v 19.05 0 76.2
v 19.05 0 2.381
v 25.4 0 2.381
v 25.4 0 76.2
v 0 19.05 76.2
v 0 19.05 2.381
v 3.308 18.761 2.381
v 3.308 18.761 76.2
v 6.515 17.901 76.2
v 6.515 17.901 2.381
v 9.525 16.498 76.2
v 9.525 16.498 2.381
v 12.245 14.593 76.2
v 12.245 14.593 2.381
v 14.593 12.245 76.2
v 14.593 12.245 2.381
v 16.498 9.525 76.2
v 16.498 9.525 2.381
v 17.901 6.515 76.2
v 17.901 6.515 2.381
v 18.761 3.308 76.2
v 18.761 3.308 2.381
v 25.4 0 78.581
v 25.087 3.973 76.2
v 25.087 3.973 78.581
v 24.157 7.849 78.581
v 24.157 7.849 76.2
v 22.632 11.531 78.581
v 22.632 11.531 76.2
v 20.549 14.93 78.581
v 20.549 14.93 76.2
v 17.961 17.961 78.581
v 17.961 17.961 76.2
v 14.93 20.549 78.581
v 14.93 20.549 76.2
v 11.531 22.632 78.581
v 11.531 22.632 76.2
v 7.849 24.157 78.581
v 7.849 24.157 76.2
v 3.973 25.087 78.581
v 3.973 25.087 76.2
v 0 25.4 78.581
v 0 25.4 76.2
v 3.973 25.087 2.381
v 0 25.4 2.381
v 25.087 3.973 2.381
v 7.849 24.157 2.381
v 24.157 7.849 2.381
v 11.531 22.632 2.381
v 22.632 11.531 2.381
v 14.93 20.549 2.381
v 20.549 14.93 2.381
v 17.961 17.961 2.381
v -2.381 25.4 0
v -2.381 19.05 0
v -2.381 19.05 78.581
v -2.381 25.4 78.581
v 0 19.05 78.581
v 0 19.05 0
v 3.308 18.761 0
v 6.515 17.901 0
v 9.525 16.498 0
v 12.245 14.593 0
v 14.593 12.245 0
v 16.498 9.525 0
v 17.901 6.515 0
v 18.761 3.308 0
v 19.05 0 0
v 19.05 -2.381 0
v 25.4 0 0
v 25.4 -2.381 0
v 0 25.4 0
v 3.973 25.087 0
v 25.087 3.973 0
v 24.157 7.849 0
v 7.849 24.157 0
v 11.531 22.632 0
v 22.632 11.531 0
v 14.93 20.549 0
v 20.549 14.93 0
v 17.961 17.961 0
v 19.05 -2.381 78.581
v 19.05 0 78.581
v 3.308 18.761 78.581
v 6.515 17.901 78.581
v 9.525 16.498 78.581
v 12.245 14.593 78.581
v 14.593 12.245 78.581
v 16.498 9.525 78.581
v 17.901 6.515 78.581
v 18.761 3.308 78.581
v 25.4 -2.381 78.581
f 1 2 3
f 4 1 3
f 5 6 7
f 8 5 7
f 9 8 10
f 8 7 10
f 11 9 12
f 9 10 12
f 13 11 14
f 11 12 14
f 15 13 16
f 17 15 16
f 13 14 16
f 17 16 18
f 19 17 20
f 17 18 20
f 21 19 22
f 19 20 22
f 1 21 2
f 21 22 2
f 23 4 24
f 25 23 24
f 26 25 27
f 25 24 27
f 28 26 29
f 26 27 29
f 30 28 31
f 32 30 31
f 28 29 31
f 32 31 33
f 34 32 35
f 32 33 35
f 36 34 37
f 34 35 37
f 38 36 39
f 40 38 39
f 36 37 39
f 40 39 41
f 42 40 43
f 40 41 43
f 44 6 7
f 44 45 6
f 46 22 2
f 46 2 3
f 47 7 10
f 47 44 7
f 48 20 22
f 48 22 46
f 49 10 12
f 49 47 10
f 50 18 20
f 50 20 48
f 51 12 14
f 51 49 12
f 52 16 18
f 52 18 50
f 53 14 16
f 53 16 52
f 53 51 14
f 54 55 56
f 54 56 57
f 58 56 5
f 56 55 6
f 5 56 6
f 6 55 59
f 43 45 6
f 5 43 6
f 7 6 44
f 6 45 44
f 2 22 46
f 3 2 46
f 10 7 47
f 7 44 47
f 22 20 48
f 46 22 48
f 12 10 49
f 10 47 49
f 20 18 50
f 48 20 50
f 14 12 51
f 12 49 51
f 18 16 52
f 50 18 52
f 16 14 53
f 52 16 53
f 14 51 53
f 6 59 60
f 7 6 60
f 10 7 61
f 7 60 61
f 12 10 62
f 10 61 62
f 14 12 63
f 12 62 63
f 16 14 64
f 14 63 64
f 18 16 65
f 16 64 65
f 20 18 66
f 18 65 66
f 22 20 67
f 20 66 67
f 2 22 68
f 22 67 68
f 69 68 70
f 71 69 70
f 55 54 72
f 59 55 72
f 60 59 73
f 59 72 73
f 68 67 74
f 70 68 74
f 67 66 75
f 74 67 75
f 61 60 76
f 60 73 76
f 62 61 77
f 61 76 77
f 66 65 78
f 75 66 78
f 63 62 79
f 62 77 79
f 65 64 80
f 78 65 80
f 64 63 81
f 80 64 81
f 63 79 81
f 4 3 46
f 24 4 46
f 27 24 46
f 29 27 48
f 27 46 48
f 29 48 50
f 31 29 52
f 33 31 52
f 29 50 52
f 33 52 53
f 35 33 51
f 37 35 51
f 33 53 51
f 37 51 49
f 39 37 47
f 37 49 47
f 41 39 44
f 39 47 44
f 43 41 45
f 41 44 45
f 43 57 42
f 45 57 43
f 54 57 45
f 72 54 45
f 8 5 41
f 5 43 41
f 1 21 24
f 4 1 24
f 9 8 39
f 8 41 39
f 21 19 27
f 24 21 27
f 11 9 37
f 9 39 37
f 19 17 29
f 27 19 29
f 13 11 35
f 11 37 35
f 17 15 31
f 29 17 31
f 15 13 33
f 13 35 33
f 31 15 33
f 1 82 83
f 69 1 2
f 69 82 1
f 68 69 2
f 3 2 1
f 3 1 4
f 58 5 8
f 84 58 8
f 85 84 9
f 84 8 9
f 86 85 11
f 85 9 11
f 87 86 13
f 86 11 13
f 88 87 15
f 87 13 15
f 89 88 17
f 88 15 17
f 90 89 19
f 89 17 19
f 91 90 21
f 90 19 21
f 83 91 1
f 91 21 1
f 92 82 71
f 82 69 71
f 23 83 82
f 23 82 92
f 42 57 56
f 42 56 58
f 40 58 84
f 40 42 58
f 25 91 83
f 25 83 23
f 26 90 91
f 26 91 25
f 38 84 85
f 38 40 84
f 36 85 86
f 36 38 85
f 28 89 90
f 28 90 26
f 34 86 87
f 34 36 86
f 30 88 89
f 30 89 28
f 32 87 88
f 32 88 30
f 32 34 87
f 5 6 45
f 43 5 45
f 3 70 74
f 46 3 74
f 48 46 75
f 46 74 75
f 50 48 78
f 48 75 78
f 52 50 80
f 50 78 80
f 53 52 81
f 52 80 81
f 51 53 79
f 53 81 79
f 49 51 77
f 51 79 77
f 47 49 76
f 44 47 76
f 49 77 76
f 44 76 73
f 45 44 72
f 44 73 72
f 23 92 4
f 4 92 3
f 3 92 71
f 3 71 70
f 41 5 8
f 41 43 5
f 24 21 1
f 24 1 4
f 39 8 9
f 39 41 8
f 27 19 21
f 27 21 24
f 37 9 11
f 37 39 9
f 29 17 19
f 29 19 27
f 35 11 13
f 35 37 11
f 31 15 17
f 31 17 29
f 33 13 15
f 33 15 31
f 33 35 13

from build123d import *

# Parameters (mm, degrees)
F1_DEPTH = 2.38125
F0_W     = 6.35
F0_H     = 2.38125
F0_W_2   = 2.38125
F0_H_2   = 6.35
F2_DEPTH = 76.2
F3_W     = 6.35
F3_H     = 2.38125
F3_W_2   = 2.38125
F3_H_2   = 6.35
F4_DEPTH = 2.38125
F5_DEPTH = 73.81875


# Not quite as in the source:
# - a length typed as a fraction of an inch, garbled in the dataset ("3 / 203.2 mm" for 3/8 in), is restored
# - a feature names something its author has since deleted; it is built from what else it names


with BuildPart() as f1:
    # F0 (on Top) → F1 (new body)
    with BuildSketch(Plane.XY):
        with BuildLine():
            ThreePointArc((0, 19.05), (13.4703841816, 13.4703841816), (19.05, 0))
            Line((19.05, 0), (25.4, 0))
            ThreePointArc((25.4, 0), (17.9605122421, 17.9605122421), (0, 25.4))
            Line((0, 25.4), (0, 19.05))
        make_face()
    extrude(amount=F1_DEPTH)

    # F0 (on Top) → F2 (join)
    with BuildSketch(Plane.XY):
        with Locations((22.225, -1.190625)):
            Rectangle(F0_W, F0_H)
        with Locations((-1.190625, 22.225)):
            Rectangle(F0_W_2, F0_H_2)
    extrude(amount=F2_DEPTH)

    # F3 (on face) → F4 (join)
    with BuildSketch(Plane.XY.offset(76.2)):
        with Locations((22.225, -1.190625)):
            Rectangle(F3_W, F3_H)
        with BuildLine():
            ThreePointArc((0, 19.05), (13.4703841816, 13.4703841816), (19.05, 0))
            Line((19.05, 0), (25.4, 0))
            ThreePointArc((25.4, 0), (17.9605122421, 17.9605122421), (0, 25.4))
            Line((0, 25.4), (0, 19.05))
        make_face()
        with Locations((-1.190625, 22.225)):
            Rectangle(F3_W_2, F3_H_2)
    extrude(amount=F4_DEPTH)


with BuildPart() as f5:
    # F5 (new): a face of the model
    f5_faces = [f1.part.faces().sort_by_distance(p)[0] for p in [
        (14.2451252874, 14.2451252874, 2.38125),
    ]]
    extrude(f5_faces, amount=F5_DEPTH)


solid = Compound([f1.part, f5.part])
